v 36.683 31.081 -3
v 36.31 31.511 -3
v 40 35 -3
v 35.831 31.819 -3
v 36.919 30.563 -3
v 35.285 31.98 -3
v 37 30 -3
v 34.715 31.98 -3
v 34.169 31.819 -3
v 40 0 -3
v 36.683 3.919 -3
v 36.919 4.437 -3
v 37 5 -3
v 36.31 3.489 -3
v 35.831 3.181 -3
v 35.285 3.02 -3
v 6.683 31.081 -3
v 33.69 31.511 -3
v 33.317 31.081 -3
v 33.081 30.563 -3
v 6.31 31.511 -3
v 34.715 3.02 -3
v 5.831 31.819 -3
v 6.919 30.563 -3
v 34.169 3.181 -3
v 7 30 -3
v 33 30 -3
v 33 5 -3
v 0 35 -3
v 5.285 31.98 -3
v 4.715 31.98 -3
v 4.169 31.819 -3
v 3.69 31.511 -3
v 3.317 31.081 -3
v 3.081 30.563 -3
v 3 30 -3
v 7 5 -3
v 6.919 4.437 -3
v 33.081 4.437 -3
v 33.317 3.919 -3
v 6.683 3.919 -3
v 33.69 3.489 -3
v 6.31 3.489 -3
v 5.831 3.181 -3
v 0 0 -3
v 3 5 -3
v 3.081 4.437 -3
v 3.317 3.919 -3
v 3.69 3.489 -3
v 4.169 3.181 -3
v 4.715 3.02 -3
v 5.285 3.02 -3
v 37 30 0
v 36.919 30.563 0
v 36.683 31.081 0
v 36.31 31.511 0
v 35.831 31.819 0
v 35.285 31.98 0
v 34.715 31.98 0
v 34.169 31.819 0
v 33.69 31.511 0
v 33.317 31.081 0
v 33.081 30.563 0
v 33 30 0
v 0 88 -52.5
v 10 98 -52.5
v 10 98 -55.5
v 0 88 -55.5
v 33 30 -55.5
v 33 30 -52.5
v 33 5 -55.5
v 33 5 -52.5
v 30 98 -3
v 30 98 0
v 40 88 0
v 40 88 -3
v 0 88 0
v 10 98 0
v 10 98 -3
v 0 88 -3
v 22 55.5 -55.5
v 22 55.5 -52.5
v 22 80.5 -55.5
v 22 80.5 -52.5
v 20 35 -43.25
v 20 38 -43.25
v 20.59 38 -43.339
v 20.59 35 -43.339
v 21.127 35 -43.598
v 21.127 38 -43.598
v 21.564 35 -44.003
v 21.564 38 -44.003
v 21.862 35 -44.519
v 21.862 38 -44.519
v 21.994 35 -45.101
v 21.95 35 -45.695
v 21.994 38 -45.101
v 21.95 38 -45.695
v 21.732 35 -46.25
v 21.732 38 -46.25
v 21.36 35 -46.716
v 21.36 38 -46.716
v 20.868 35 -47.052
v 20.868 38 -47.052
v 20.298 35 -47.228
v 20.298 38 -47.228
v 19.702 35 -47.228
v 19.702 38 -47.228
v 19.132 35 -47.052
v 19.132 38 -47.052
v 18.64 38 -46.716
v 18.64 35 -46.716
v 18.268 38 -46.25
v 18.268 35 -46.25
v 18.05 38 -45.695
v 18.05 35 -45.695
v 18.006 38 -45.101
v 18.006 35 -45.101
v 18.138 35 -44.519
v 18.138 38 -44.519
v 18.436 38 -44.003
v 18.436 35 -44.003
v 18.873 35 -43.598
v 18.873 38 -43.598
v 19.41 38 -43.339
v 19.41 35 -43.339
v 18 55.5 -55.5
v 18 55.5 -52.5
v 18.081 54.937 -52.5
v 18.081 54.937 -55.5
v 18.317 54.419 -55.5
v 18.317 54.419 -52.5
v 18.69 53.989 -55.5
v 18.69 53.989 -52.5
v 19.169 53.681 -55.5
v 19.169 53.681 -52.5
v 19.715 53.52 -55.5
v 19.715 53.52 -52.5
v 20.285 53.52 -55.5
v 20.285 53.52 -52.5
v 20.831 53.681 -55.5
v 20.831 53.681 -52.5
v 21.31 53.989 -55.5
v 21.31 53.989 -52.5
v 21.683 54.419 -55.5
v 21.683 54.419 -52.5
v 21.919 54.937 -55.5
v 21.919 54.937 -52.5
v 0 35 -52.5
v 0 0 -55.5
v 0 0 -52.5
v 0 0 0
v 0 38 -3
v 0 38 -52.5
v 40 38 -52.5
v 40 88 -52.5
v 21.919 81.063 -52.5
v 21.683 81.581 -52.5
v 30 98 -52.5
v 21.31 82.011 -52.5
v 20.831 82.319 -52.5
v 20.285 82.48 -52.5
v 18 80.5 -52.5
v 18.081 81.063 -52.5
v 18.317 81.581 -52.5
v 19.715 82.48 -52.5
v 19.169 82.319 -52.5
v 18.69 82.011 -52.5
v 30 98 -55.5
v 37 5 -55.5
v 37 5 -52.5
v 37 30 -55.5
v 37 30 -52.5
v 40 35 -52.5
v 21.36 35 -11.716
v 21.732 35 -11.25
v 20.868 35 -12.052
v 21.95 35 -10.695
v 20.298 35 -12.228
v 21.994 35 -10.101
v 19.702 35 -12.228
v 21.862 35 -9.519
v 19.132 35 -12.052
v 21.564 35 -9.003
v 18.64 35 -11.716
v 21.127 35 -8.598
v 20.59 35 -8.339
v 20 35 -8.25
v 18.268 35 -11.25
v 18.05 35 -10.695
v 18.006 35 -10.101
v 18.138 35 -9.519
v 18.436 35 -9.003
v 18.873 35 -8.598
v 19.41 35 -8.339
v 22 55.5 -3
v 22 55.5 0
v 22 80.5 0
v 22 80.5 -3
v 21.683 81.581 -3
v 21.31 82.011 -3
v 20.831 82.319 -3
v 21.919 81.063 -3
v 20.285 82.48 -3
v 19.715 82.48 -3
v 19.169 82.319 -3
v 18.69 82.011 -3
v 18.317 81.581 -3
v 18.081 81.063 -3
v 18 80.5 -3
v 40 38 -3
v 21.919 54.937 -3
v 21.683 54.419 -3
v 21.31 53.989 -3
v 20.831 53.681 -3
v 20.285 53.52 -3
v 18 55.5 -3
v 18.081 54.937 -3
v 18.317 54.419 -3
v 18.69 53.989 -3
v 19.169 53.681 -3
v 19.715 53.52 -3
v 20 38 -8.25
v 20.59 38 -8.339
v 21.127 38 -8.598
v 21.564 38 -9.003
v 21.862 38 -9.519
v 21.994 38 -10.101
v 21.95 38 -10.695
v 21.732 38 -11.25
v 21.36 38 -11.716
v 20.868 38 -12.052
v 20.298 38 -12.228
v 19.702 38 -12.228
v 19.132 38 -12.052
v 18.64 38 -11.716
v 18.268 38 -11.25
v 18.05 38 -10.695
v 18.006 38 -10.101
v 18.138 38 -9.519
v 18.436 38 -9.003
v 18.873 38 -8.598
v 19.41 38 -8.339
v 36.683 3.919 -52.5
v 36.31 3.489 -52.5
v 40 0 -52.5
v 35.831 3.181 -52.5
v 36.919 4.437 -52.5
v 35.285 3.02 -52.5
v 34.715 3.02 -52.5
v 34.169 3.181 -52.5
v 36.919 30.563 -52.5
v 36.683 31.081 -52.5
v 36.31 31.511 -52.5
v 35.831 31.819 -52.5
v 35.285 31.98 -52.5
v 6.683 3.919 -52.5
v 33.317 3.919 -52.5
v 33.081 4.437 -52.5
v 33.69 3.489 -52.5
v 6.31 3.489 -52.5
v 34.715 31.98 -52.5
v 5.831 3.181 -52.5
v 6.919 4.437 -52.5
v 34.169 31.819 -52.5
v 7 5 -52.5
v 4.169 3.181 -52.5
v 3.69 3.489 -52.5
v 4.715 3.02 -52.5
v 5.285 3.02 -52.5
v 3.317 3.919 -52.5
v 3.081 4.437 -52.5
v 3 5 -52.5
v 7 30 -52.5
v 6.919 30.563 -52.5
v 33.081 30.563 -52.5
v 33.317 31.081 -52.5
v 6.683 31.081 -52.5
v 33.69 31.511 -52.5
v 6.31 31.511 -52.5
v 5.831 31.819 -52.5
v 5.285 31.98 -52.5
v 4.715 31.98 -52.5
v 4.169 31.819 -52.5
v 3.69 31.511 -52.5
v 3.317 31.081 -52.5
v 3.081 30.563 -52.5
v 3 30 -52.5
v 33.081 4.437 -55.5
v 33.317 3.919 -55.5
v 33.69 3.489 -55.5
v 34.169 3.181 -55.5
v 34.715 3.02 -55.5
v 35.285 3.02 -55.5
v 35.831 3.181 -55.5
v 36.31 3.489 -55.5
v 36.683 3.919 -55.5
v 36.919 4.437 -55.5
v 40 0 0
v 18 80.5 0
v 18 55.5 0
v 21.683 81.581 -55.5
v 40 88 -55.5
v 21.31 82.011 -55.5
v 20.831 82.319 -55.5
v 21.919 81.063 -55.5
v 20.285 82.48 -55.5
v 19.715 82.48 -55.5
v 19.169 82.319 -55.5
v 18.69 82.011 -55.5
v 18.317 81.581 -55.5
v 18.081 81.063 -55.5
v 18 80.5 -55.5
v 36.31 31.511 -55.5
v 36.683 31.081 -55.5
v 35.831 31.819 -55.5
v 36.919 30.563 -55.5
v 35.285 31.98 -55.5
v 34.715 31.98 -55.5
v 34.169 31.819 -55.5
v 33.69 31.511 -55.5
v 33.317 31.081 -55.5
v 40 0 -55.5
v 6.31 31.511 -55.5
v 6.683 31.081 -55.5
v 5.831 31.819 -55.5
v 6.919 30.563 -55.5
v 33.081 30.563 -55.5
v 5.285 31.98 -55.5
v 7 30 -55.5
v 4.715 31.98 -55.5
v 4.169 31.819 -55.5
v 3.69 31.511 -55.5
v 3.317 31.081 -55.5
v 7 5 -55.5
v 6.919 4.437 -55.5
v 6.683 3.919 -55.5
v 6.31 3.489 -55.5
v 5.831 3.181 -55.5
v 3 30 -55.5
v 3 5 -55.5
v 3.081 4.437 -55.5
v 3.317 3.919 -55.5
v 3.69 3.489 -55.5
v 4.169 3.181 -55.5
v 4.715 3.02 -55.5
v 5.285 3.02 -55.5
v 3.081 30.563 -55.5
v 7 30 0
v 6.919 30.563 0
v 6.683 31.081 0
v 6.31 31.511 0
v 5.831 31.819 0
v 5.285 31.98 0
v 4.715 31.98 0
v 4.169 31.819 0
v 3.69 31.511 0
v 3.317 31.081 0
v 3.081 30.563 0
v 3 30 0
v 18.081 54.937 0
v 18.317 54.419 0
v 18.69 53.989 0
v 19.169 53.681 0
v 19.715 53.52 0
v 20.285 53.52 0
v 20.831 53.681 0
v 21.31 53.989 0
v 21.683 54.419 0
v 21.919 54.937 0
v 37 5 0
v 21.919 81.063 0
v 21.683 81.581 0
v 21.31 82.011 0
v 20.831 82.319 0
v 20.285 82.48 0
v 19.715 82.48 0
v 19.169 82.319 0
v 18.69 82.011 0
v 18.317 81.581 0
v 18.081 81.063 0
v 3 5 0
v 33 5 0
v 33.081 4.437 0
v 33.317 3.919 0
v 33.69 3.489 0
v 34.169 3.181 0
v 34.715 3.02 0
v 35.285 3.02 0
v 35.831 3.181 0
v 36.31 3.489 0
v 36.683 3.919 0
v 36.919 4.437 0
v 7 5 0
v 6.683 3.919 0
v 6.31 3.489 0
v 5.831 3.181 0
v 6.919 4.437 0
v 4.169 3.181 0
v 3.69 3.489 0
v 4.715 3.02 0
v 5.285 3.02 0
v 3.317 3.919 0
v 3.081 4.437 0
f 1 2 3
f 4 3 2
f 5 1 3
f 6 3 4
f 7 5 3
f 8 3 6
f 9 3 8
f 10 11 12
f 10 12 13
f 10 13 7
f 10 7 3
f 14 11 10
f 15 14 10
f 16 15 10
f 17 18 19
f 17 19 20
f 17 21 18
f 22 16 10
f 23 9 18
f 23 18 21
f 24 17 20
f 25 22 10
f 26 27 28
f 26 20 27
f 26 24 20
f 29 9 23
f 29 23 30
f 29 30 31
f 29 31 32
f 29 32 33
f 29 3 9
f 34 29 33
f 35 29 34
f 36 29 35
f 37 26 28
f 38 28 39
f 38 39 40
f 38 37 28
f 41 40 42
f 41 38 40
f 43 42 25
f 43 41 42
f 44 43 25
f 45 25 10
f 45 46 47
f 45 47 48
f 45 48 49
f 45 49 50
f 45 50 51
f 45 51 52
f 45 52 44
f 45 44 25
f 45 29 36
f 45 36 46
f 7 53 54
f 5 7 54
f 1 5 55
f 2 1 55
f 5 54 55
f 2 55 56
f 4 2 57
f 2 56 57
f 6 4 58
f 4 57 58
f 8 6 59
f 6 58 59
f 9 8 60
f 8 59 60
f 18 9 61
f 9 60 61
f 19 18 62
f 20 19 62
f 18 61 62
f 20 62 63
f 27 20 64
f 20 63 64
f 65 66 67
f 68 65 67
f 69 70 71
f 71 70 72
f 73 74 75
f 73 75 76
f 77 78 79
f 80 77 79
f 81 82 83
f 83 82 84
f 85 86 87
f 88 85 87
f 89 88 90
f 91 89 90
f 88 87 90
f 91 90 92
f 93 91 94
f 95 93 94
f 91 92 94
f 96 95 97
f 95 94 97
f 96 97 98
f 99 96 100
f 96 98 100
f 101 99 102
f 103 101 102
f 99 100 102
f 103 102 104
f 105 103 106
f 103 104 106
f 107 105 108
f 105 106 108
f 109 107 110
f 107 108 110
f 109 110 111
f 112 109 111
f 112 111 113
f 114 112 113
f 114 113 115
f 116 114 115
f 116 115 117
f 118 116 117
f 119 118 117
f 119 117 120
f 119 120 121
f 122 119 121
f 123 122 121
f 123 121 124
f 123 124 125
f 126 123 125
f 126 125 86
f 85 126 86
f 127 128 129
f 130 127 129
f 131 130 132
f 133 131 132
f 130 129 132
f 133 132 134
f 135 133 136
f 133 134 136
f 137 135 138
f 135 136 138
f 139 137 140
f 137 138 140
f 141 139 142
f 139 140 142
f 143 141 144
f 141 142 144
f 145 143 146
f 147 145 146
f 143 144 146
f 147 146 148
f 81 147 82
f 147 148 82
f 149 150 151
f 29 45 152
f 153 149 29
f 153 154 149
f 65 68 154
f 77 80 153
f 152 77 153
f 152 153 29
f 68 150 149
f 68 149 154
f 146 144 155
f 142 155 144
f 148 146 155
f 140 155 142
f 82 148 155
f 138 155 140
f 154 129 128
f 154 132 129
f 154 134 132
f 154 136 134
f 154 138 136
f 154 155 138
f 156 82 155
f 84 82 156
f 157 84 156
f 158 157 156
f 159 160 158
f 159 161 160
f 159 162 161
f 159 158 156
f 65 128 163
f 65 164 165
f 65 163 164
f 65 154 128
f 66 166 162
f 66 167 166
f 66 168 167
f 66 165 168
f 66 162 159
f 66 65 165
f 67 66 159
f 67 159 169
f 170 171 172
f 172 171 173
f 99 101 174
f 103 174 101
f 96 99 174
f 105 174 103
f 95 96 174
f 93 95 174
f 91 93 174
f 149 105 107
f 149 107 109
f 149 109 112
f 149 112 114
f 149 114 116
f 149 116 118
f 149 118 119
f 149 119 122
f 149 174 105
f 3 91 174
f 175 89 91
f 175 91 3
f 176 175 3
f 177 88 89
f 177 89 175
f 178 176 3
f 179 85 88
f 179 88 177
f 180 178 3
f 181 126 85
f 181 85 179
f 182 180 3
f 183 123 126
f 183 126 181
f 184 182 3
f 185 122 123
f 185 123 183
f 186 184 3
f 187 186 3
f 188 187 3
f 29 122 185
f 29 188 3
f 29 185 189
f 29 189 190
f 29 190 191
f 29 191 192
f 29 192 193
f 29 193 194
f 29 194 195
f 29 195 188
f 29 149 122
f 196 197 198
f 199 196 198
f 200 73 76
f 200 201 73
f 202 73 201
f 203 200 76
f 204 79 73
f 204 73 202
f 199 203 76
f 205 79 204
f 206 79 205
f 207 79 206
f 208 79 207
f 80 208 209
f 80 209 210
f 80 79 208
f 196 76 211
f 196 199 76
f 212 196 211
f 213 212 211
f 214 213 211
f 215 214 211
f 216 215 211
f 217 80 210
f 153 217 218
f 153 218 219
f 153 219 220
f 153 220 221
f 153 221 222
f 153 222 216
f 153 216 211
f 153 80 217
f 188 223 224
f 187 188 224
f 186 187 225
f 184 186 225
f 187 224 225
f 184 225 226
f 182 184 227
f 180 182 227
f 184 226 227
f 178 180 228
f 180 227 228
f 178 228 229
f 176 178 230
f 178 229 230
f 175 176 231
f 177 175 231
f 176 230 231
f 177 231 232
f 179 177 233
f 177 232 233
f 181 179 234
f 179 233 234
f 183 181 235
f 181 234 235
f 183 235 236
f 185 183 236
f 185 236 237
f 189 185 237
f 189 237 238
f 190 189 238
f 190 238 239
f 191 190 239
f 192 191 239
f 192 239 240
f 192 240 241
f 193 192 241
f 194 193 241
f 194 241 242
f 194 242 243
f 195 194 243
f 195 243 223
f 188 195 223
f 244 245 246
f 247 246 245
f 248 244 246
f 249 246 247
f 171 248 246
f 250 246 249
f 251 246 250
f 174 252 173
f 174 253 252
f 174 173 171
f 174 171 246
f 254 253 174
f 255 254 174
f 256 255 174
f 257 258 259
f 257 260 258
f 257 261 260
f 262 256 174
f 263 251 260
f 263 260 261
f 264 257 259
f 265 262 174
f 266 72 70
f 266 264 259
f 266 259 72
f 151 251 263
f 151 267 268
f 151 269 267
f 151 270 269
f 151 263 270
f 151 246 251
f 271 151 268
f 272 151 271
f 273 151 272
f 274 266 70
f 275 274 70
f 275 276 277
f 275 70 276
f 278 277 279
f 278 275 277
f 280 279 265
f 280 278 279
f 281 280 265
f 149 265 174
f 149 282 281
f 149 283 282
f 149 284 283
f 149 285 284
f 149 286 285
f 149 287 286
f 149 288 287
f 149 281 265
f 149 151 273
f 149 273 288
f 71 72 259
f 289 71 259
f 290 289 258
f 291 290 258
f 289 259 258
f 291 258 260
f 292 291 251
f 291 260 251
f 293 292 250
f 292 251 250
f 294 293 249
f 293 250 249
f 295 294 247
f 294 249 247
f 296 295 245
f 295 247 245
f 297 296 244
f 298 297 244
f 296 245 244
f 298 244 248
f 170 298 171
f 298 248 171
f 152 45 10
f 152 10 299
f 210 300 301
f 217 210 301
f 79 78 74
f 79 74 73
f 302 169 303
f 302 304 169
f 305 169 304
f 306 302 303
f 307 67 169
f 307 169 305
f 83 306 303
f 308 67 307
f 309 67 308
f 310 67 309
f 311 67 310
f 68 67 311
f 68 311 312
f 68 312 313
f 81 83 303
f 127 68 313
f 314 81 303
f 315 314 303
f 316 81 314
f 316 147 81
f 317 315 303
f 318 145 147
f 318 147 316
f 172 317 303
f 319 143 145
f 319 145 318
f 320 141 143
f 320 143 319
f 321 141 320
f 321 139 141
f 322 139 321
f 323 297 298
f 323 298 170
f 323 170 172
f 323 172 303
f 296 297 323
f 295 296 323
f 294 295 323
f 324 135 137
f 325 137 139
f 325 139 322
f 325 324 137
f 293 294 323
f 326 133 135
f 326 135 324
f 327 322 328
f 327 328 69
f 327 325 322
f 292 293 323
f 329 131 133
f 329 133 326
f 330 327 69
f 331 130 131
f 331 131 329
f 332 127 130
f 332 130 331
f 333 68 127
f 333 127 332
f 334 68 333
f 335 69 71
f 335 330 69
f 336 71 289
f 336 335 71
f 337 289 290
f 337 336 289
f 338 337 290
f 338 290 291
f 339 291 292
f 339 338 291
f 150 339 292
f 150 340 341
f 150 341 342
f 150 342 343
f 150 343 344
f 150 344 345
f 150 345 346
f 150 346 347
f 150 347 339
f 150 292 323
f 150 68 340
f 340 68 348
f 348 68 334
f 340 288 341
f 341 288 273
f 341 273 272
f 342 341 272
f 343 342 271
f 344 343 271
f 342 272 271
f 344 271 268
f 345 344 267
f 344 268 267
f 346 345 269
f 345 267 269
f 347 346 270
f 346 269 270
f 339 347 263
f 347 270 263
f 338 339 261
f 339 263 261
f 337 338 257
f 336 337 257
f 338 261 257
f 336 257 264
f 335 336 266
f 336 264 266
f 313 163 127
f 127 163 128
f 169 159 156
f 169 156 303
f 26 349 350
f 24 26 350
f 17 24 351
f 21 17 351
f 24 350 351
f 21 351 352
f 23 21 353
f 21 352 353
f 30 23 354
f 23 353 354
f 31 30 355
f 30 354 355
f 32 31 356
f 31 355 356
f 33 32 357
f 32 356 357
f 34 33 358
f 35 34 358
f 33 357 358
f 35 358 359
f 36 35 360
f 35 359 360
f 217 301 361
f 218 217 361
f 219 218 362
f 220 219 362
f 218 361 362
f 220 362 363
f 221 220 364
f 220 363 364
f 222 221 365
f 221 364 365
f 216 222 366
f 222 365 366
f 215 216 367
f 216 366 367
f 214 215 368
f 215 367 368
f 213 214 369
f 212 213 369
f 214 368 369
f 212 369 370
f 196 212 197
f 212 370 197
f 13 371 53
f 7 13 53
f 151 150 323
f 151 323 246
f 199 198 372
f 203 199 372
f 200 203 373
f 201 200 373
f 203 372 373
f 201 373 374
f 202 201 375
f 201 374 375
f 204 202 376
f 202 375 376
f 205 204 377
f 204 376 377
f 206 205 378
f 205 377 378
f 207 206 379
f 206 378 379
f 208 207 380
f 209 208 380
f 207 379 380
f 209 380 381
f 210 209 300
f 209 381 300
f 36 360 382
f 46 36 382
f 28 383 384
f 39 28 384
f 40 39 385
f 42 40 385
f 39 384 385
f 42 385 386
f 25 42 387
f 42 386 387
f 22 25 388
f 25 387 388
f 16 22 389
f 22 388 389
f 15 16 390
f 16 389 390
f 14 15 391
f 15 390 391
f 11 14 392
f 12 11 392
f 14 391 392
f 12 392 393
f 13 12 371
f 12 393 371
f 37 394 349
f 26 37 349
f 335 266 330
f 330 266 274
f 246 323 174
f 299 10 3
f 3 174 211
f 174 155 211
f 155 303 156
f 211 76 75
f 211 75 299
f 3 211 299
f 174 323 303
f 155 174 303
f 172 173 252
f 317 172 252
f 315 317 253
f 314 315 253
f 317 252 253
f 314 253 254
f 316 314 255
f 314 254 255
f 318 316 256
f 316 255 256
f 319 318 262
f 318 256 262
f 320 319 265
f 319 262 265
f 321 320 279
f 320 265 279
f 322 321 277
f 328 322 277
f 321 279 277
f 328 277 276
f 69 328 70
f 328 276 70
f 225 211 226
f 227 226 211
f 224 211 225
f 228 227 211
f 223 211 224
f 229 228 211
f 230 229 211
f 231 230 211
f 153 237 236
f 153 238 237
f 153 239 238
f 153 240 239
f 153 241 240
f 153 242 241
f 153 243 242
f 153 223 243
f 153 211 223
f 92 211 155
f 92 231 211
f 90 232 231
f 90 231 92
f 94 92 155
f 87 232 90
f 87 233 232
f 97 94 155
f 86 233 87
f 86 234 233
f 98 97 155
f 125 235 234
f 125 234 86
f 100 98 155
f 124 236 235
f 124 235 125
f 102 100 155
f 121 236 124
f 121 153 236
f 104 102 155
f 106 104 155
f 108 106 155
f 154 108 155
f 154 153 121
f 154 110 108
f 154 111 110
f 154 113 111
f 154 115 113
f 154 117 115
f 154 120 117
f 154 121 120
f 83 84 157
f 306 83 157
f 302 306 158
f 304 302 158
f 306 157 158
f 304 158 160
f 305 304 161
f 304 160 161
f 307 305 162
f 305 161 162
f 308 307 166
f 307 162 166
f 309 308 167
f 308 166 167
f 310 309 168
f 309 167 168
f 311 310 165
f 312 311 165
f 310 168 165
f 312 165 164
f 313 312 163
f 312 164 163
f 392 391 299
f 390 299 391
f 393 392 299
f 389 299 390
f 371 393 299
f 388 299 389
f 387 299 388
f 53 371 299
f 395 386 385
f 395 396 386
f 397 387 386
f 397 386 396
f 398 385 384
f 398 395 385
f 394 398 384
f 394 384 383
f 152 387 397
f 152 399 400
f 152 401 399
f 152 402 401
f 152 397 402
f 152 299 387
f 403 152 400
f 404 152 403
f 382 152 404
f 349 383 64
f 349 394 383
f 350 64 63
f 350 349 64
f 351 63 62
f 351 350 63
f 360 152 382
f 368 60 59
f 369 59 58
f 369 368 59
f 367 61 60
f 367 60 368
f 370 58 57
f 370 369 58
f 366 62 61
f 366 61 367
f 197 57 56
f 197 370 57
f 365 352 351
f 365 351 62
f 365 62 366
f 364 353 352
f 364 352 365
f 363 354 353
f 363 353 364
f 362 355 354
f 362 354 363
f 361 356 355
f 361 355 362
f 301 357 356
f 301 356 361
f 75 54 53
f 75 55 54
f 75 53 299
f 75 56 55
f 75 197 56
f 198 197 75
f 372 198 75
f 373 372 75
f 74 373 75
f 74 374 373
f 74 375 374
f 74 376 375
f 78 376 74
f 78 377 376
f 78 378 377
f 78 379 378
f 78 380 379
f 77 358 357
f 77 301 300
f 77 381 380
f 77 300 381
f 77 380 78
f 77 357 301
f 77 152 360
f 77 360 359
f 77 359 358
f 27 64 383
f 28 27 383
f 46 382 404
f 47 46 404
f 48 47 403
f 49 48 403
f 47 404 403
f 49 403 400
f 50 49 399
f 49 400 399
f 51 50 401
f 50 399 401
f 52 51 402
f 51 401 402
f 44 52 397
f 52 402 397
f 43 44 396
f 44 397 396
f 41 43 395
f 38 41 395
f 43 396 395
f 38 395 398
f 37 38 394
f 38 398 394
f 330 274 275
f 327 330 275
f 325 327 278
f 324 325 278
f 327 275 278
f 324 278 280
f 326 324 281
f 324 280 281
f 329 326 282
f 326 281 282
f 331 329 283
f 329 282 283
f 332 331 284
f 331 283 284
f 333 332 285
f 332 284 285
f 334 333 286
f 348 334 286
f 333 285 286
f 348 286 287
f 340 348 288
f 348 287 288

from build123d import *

# Parameters (mm, degrees)
SALIENTE_EXTRUIR1_DEPTH = 40
CORTAR_EXTRUIR1_DEPTH   = 79
CHAFL_N1_SIZE           = 10
CROQUIS6_R              = 2
CORTAR_EXTRUIR2_DEPTH   = 9


with BuildPart() as part:
    # Croquis1 → Saliente-Extruir1 (new body)
    with BuildSketch(Plane(origin=(0, 0, 0), x_dir=(0, 0, -1), z_dir=(1, 0, 0))):
        Polygon((0, 0), (0, 98), (3, 98), (3, 38), (52.5, 38), (52.5, 98), (55.5, 98), (55.5, 0), (52.5, 0), (52.5, 35), (3, 35), (3, 0), align=None)
    extrude(amount=SALIENTE_EXTRUIR1_DEPTH)

    # Croquis3 → Cortar-Extruir1 (cut)
    with BuildSketch(Plane.XY):
        with BuildLine():
            Line((18, 80.5), (18, 55.5))
            ThreePointArc((18, 55.5), (20, 53.5), (22, 55.5))
            Line((22, 55.5), (22, 80.5))
            ThreePointArc((22, 80.5), (20, 82.5), (18, 80.5))
        make_face()
        with BuildLine():
            Line((3, 30), (3, 5))
            ThreePointArc((3, 5), (5, 3), (7, 5))
            Line((7, 5), (7, 30))
            ThreePointArc((7, 30), (5, 32), (3, 30))
        make_face()
        with BuildLine():
            Line((33, 30), (33, 5))
            ThreePointArc((33, 5), (35, 3), (37, 5))
            Line((37, 5), (37, 30))
            ThreePointArc((37, 30), (35, 32), (33, 30))
        make_face()
    extrude(amount=-CORTAR_EXTRUIR1_DEPTH, mode=Mode.SUBTRACT)

    # Chaflán1
    chafl_n1_edges = [part.edges().sort_by_distance(p)[0] for p in [
        (0, 98, -1.5),
        (0, 98, -54),
        (40, 98, -54),
        (40, 98, -1.5),
    ]]
    chamfer(chafl_n1_edges, length=CHAFL_N1_SIZE)

    # Croquis6 → Cortar-Extruir2 (cut)
    with BuildSketch(Plane(origin=(0, 38, 0), x_dir=(1, 0, 0), z_dir=(0, 1, 0))):
        with Locations(Location((20, 45.25, 0), (0, 0, 270))):
            Circle(CROQUIS6_R)
        with Locations(Location((20, 10.25, 0), (0, 0, 270))):
            Circle(CROQUIS6_R)
    extrude(amount=-CORTAR_EXTRUIR2_DEPTH, mode=Mode.SUBTRACT)


solid = part.part
